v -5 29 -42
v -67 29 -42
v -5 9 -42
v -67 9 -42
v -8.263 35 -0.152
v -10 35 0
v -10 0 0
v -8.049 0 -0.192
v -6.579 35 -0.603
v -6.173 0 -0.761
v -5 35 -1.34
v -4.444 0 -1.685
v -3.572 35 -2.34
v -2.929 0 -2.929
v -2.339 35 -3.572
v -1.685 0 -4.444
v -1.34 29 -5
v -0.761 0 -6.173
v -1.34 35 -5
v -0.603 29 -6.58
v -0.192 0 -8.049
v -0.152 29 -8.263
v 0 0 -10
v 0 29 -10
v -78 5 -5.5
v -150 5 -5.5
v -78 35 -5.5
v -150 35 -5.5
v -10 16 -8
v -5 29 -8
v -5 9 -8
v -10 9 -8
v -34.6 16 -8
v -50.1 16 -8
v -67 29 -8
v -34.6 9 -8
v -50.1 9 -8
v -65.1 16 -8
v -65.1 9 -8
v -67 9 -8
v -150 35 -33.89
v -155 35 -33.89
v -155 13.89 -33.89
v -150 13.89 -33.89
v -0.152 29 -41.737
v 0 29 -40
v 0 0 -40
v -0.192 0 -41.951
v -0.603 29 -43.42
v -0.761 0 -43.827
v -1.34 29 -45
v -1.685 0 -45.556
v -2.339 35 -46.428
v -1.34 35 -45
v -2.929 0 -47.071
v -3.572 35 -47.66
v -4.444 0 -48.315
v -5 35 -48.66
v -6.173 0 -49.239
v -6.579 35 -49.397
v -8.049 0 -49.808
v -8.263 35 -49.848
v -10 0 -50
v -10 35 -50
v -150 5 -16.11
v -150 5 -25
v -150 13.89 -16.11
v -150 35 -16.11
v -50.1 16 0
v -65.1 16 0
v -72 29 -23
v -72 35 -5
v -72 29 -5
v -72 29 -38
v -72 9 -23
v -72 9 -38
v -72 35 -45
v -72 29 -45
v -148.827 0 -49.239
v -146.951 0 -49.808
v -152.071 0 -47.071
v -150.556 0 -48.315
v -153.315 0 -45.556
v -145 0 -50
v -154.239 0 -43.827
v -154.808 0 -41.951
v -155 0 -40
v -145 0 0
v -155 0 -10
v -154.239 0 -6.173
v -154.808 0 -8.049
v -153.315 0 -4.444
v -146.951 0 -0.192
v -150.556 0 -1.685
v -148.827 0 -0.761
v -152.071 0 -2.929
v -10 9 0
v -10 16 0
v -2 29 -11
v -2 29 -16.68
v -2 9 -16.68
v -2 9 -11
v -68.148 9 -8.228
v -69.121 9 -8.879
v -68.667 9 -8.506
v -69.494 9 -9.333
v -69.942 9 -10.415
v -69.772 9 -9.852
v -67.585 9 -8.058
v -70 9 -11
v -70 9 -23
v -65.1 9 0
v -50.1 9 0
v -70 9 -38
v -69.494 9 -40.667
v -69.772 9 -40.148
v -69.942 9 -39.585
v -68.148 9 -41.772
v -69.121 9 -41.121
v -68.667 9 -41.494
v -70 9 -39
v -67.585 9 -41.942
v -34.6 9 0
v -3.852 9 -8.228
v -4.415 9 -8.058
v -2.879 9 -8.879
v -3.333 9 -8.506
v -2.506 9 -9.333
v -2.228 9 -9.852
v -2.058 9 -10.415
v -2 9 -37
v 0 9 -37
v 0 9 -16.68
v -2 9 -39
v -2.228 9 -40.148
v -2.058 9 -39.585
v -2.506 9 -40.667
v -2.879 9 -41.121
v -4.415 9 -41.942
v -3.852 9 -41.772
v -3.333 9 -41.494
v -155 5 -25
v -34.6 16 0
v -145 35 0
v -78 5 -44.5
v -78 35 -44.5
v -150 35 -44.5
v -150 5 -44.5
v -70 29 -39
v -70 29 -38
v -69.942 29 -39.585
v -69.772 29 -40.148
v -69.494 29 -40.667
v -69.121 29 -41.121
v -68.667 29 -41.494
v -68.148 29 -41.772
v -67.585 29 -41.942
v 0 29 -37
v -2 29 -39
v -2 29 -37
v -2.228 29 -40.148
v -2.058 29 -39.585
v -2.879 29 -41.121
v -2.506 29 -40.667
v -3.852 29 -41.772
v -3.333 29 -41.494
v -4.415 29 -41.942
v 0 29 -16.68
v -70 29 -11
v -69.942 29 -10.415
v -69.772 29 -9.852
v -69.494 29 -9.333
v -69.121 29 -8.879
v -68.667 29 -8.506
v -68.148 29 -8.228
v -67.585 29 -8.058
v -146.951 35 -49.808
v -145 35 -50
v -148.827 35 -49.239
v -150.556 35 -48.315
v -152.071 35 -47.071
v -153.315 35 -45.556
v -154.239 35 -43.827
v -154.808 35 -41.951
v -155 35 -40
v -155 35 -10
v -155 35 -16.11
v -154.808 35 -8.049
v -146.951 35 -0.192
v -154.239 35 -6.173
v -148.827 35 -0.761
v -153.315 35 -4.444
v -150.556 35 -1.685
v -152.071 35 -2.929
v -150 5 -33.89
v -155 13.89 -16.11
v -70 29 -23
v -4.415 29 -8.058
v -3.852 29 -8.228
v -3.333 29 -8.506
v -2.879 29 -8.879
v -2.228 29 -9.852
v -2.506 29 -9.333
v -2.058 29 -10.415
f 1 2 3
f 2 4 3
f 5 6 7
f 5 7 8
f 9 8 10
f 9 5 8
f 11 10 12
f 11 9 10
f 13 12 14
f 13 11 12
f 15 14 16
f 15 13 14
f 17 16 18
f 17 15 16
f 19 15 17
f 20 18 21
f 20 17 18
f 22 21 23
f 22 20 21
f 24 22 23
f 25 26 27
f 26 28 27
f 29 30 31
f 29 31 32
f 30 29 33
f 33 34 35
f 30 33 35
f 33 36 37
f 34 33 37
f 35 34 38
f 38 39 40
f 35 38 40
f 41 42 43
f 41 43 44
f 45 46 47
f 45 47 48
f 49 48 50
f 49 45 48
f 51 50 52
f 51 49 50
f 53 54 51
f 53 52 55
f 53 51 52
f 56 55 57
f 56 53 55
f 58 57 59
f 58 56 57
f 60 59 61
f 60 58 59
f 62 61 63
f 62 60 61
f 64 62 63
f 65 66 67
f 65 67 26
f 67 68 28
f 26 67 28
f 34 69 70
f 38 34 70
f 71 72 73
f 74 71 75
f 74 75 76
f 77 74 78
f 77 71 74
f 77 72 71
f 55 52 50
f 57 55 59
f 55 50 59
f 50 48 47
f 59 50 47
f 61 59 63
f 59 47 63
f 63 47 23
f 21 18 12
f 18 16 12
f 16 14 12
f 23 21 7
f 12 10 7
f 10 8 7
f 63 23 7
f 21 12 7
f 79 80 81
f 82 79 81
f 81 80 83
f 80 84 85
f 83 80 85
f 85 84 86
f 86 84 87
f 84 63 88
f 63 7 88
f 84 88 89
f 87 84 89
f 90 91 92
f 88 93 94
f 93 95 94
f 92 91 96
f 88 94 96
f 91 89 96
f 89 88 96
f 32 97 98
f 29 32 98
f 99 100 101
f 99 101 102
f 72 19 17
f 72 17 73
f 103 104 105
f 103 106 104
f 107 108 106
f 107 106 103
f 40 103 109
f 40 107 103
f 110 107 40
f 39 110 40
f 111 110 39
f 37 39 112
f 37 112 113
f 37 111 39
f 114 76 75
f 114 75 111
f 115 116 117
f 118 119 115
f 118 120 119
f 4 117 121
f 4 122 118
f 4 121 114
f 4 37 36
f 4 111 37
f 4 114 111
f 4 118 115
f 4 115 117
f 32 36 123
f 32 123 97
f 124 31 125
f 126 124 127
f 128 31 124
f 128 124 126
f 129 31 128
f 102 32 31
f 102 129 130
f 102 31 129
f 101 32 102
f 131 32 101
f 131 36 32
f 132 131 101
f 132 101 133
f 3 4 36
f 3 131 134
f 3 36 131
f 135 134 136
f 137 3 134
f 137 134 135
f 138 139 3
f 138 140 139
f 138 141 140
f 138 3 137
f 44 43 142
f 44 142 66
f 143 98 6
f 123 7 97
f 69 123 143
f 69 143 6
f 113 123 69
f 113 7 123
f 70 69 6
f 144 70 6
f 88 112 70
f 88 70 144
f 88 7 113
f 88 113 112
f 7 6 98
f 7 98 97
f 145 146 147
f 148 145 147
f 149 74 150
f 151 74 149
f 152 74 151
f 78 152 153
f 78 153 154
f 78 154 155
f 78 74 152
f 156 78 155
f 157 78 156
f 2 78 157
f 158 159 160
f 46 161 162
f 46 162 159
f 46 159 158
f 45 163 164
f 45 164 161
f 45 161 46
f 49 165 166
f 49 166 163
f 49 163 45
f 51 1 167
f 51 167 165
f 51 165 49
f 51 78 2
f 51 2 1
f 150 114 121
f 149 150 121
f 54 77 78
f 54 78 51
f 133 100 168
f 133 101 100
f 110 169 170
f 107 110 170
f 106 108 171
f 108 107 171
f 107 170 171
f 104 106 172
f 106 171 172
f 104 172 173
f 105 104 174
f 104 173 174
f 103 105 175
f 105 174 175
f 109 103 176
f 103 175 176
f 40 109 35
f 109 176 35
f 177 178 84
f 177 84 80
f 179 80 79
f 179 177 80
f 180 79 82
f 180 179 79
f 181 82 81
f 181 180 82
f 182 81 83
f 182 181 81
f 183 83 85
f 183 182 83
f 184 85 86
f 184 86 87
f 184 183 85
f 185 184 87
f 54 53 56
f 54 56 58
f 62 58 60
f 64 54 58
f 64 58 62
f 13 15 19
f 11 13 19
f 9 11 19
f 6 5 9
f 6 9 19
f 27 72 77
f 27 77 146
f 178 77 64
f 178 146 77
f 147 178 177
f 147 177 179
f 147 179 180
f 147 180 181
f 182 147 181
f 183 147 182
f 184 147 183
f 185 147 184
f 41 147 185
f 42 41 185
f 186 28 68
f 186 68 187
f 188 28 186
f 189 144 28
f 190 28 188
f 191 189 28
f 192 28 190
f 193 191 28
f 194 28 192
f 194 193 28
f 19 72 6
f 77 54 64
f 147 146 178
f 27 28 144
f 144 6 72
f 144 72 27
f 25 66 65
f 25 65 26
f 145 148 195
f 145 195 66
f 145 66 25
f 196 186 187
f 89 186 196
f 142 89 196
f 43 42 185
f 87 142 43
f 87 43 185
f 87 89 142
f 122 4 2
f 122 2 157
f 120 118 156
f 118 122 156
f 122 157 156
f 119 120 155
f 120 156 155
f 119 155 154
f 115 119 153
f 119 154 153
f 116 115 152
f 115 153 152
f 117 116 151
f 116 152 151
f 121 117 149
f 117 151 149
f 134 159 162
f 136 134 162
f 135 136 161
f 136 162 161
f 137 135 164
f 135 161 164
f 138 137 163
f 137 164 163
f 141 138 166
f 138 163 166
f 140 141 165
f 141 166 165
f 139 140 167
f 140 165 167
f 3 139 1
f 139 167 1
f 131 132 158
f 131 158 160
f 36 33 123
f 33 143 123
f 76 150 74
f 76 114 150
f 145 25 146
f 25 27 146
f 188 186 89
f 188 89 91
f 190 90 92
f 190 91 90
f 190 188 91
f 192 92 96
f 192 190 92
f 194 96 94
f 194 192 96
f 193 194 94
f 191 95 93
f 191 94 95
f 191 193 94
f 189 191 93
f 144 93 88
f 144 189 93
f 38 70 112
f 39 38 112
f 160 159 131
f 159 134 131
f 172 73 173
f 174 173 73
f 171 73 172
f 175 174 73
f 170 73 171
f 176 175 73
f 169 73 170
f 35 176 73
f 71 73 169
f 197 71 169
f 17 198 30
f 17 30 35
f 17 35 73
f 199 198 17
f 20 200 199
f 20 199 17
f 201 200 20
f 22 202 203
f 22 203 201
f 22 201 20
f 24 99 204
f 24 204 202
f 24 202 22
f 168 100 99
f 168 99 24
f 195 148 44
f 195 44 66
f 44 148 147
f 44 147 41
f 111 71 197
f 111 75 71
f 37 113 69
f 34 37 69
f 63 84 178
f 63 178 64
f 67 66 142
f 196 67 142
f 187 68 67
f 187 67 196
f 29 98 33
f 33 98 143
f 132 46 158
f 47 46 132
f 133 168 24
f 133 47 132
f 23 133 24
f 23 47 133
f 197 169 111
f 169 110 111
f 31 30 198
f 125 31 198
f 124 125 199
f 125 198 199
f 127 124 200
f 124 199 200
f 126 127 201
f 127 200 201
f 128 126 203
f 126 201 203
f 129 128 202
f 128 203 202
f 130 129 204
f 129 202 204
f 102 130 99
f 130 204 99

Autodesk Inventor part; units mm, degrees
ref_plane "YZ Plane" through (0, 0, 0) normal (1, 0, 0) x (0, 1, 0)
ref_plane "XZ Plane" through (0, 0, 0) normal (0, 1, 0) x (-1, 0, 0)
ref_plane "XY Plane" through (0, 0, 0) normal (0, 0, 1) x (1, 0, 0)
sketch "Sketch2" plane through (0, 0, 0) normal (0, 1, 0) x (-1, 0, 0)
  line L0 (0, 0) -> (155, 0)
  line L1 (155, 0) -> (155, -50)
  line L2 (155, -50) -> (0, -50)
  line L3 (0, -50) -> (0, 0)
  dimension "d4" = 155
  dimension "d5" = 50
extrude "Extrusion2" add sketch "Sketch2" along normal blind 35
sketch "Sketch4" plane through (0, 35, 0) normal (0, 1, 0) x (1, 0, 0)
  line L0 (0, 0) -> (0, 50) projected
  line L1 (0, 5) -> (-72, 5)
  line L2 (-72, 5) -> (-72, 45)
  line L3 (-72, 45) -> (0, 45)
  line L4 (0, 45) -> (0, 5)
  line L5 (-155, 50) -> (-155, 0) construction
  line L6 (-155, 25) -> (0, 25) construction
  dimension "d8" = 72
  dimension "d9" = 40
extrude "Extrusion3" cut sketch "Sketch4" against normal blind 26
sketch "Sketch5" plane through (0, 9, 0) normal (0, 1, 0) x (1, 0, 0)
  line L0 (0, 5) -> (-72, 5) projected
  line L1 (-72, 45) -> (0, 45) projected
  line L2 (0, 5) -> (-72, 5)
  line L3 (-72, 5) -> (-72, 23)
  line L4 (-72, 45) -> (0, 45)
  line L5 (0, 45) -> (0, 16.68)
  line L6 (-2, 8) -> (-70, 8)
  line L7 (-70, 8) -> (-70, 23)
  line L8 (-70, 42) -> (-2, 42)
  line L9 (-2, 42) -> (-2, 37)
  line L10 (0, 50) -> (0, 0) construction
  line L11 (0, 25) -> (-72, 25) construction
  line L12 (-72, 5) -> (-72, 45) construction
  line L13 (-36, 5) -> (-36, 42) construction
  line L14 (0, 45) -> (0, 5) projected
  line L15 (-2, 16.68) -> (0, 16.68)
  line L16 (0, 37) -> (-2, 37)
  line L17 (-2, 16.68) -> (-2, 8)
  line L18 (0, 16.68) -> (0, 5)
  line L19 (-72, 5) -> (-72, 45) projected
  line L20 (-70, 38) -> (-72, 38)
  line L21 (-72, 38) -> (-72, 23) construction
  line L22 (-72, 23) -> (-70, 23)
  line L23 (-70, 23) -> (-70, 25) construction
  line L24 (-70, 38) -> (-70, 42)
  line L25 (-70, 23) -> (-70, 38) construction
  line L26 (-72, 23) -> (-72, 38)
  line L27 (-72, 38) -> (-72, 45)
  dimension "d12" = 68
  dimension "d13" = 34
  dimension "d17" = 20.32
  dimension "d43" = 15
  dimension "d44" = 4
  dimension "d52" = 8
extrude "Extrusion5" add sketch "Sketch5" along normal blind 20 contours L0 L3 L22 L7 L6 L17 L15 L14 | L16 L9 L8 L24 L20 L19 L1 L5
fillet "Fillet2" radius 3 4 edges at (-2, 19, -8) (-70, 19, -8) (-70, 19, -42) (-2, 19, -42)
sketch "Sketch7" plane through (-155, 0, 0) normal (0, 0, 1) x (1, 0, 0)
  line L0 (89.9, 9) -> (104.9, 9)
  line L1 (104.9, 9) -> (104.9, 16)
  line L2 (104.9, 16) -> (89.9, 16)
  line L3 (89.9, 16) -> (89.9, 9)
  line L4 (89.9, 12.5) -> (104.9, 12.5) construction
  line L5 (97.4, 16) -> (97.4, 9) construction
  line L6 (88, 29) -> (88, 9) construction
  line L7 (88, 9) -> (150, 9) construction
  line L8 (85, 9) -> (85, 29) projected
  line L9 (120.4, 9) -> (132.4, 9)
  line L10 (132.4, 9) -> (132.4, 16) construction
  line L11 (132.4, 16) -> (120.4, 16)
  line L12 (120.4, 16) -> (120.4, 9)
  line L13 (133, 9) -> (145, 9)
  line L14 (145, 9) -> (145, 16)
  line L15 (145, 16) -> (133, 16)
  line L16 (133, 16) -> (133, 9) construction
  line L17 (126.4, 16) -> (126.4, 9) construction
  line L18 (139, 16) -> (139, 9) construction
  line L19 (132.4, 16) -> (133, 16) construction
  line L20 (132.4, 16) -> (133, 16)
  line L21 (132.4, 9) -> (133, 9)
  point P0 (155, 0)
  dimension "d29" = 15
  dimension "d30" = 7
  dimension "d32" = 0
  dimension "d35" = 12.4
  dimension "d36" = 12
  dimension "d37" = 7
  dimension "d38" = 12
  dimension "d39" = 7
  dimension "d40" = 41.4
  dimension "d41" = 54
extrude "Extrusion7" cut sketch "Sketch7" against normal up to next
sketch "Sketch9" plane through (0, 35, 0) normal (0, 1, 0) x (1, 0, 0)
  line L0 (-78, 44.5) -> (-150, 44.5)
  line L1 (-150, 44.5) -> (-150, 33.89)
  line L2 (-150, 5.5) -> (-78, 5.5)
  line L3 (-78, 5.5) -> (-78, 44.5)
  line L4 (0, 50) -> (0, 0) construction
  line L5 (0, 25) -> (-155, 25) construction
  line L6 (-155, 0) -> (-155, 50) construction
  line L7 (-150, 25) -> (-78, 25) construction
  line L8 (-155, 50) -> (-155, 0) projected
  line L9 (-150, 16.11) -> (-155, 16.11)
  line L10 (-155, 16.11) -> (-155, 33.89)
  line L11 (-155, 33.89) -> (-150, 33.89)
  line L12 (-150, 33.89) -> (-150, 25) construction
  line L13 (-150, 25) -> (-155, 25) construction
  line L14 (-150, 33.89) -> (-150, 25) construction
  line L15 (-150, 16.11) -> (-150, 5.5)
  line L16 (-150, 25) -> (-150, 16.11) construction
  line L17 (-150, 25) -> (-150, 16.11) construction
  dimension "d45" = 72
  dimension "d46" = 39
  dimension "d47" = 5
  dimension "d50" = 17.78
extrude "Extrusion8" cut sketch "Sketch9" against normal blind 30
fillet "Fillet3" radius 10 4 edges at (0, 17.5, 0) (0, 17.5, -50) (-155, 17.5, 0) (-155, 17.5, -50)
chamfer "Chamfer1" distance 8.89 angle 45 2 edges at (-152.5, 5, -33.89) (-152.5, 5, -16.11)
equation "\"d37\" = d30"
equation "\"d38\" = d36"
equation "\"d39\" = d37"
properties part number "PiHolder"
